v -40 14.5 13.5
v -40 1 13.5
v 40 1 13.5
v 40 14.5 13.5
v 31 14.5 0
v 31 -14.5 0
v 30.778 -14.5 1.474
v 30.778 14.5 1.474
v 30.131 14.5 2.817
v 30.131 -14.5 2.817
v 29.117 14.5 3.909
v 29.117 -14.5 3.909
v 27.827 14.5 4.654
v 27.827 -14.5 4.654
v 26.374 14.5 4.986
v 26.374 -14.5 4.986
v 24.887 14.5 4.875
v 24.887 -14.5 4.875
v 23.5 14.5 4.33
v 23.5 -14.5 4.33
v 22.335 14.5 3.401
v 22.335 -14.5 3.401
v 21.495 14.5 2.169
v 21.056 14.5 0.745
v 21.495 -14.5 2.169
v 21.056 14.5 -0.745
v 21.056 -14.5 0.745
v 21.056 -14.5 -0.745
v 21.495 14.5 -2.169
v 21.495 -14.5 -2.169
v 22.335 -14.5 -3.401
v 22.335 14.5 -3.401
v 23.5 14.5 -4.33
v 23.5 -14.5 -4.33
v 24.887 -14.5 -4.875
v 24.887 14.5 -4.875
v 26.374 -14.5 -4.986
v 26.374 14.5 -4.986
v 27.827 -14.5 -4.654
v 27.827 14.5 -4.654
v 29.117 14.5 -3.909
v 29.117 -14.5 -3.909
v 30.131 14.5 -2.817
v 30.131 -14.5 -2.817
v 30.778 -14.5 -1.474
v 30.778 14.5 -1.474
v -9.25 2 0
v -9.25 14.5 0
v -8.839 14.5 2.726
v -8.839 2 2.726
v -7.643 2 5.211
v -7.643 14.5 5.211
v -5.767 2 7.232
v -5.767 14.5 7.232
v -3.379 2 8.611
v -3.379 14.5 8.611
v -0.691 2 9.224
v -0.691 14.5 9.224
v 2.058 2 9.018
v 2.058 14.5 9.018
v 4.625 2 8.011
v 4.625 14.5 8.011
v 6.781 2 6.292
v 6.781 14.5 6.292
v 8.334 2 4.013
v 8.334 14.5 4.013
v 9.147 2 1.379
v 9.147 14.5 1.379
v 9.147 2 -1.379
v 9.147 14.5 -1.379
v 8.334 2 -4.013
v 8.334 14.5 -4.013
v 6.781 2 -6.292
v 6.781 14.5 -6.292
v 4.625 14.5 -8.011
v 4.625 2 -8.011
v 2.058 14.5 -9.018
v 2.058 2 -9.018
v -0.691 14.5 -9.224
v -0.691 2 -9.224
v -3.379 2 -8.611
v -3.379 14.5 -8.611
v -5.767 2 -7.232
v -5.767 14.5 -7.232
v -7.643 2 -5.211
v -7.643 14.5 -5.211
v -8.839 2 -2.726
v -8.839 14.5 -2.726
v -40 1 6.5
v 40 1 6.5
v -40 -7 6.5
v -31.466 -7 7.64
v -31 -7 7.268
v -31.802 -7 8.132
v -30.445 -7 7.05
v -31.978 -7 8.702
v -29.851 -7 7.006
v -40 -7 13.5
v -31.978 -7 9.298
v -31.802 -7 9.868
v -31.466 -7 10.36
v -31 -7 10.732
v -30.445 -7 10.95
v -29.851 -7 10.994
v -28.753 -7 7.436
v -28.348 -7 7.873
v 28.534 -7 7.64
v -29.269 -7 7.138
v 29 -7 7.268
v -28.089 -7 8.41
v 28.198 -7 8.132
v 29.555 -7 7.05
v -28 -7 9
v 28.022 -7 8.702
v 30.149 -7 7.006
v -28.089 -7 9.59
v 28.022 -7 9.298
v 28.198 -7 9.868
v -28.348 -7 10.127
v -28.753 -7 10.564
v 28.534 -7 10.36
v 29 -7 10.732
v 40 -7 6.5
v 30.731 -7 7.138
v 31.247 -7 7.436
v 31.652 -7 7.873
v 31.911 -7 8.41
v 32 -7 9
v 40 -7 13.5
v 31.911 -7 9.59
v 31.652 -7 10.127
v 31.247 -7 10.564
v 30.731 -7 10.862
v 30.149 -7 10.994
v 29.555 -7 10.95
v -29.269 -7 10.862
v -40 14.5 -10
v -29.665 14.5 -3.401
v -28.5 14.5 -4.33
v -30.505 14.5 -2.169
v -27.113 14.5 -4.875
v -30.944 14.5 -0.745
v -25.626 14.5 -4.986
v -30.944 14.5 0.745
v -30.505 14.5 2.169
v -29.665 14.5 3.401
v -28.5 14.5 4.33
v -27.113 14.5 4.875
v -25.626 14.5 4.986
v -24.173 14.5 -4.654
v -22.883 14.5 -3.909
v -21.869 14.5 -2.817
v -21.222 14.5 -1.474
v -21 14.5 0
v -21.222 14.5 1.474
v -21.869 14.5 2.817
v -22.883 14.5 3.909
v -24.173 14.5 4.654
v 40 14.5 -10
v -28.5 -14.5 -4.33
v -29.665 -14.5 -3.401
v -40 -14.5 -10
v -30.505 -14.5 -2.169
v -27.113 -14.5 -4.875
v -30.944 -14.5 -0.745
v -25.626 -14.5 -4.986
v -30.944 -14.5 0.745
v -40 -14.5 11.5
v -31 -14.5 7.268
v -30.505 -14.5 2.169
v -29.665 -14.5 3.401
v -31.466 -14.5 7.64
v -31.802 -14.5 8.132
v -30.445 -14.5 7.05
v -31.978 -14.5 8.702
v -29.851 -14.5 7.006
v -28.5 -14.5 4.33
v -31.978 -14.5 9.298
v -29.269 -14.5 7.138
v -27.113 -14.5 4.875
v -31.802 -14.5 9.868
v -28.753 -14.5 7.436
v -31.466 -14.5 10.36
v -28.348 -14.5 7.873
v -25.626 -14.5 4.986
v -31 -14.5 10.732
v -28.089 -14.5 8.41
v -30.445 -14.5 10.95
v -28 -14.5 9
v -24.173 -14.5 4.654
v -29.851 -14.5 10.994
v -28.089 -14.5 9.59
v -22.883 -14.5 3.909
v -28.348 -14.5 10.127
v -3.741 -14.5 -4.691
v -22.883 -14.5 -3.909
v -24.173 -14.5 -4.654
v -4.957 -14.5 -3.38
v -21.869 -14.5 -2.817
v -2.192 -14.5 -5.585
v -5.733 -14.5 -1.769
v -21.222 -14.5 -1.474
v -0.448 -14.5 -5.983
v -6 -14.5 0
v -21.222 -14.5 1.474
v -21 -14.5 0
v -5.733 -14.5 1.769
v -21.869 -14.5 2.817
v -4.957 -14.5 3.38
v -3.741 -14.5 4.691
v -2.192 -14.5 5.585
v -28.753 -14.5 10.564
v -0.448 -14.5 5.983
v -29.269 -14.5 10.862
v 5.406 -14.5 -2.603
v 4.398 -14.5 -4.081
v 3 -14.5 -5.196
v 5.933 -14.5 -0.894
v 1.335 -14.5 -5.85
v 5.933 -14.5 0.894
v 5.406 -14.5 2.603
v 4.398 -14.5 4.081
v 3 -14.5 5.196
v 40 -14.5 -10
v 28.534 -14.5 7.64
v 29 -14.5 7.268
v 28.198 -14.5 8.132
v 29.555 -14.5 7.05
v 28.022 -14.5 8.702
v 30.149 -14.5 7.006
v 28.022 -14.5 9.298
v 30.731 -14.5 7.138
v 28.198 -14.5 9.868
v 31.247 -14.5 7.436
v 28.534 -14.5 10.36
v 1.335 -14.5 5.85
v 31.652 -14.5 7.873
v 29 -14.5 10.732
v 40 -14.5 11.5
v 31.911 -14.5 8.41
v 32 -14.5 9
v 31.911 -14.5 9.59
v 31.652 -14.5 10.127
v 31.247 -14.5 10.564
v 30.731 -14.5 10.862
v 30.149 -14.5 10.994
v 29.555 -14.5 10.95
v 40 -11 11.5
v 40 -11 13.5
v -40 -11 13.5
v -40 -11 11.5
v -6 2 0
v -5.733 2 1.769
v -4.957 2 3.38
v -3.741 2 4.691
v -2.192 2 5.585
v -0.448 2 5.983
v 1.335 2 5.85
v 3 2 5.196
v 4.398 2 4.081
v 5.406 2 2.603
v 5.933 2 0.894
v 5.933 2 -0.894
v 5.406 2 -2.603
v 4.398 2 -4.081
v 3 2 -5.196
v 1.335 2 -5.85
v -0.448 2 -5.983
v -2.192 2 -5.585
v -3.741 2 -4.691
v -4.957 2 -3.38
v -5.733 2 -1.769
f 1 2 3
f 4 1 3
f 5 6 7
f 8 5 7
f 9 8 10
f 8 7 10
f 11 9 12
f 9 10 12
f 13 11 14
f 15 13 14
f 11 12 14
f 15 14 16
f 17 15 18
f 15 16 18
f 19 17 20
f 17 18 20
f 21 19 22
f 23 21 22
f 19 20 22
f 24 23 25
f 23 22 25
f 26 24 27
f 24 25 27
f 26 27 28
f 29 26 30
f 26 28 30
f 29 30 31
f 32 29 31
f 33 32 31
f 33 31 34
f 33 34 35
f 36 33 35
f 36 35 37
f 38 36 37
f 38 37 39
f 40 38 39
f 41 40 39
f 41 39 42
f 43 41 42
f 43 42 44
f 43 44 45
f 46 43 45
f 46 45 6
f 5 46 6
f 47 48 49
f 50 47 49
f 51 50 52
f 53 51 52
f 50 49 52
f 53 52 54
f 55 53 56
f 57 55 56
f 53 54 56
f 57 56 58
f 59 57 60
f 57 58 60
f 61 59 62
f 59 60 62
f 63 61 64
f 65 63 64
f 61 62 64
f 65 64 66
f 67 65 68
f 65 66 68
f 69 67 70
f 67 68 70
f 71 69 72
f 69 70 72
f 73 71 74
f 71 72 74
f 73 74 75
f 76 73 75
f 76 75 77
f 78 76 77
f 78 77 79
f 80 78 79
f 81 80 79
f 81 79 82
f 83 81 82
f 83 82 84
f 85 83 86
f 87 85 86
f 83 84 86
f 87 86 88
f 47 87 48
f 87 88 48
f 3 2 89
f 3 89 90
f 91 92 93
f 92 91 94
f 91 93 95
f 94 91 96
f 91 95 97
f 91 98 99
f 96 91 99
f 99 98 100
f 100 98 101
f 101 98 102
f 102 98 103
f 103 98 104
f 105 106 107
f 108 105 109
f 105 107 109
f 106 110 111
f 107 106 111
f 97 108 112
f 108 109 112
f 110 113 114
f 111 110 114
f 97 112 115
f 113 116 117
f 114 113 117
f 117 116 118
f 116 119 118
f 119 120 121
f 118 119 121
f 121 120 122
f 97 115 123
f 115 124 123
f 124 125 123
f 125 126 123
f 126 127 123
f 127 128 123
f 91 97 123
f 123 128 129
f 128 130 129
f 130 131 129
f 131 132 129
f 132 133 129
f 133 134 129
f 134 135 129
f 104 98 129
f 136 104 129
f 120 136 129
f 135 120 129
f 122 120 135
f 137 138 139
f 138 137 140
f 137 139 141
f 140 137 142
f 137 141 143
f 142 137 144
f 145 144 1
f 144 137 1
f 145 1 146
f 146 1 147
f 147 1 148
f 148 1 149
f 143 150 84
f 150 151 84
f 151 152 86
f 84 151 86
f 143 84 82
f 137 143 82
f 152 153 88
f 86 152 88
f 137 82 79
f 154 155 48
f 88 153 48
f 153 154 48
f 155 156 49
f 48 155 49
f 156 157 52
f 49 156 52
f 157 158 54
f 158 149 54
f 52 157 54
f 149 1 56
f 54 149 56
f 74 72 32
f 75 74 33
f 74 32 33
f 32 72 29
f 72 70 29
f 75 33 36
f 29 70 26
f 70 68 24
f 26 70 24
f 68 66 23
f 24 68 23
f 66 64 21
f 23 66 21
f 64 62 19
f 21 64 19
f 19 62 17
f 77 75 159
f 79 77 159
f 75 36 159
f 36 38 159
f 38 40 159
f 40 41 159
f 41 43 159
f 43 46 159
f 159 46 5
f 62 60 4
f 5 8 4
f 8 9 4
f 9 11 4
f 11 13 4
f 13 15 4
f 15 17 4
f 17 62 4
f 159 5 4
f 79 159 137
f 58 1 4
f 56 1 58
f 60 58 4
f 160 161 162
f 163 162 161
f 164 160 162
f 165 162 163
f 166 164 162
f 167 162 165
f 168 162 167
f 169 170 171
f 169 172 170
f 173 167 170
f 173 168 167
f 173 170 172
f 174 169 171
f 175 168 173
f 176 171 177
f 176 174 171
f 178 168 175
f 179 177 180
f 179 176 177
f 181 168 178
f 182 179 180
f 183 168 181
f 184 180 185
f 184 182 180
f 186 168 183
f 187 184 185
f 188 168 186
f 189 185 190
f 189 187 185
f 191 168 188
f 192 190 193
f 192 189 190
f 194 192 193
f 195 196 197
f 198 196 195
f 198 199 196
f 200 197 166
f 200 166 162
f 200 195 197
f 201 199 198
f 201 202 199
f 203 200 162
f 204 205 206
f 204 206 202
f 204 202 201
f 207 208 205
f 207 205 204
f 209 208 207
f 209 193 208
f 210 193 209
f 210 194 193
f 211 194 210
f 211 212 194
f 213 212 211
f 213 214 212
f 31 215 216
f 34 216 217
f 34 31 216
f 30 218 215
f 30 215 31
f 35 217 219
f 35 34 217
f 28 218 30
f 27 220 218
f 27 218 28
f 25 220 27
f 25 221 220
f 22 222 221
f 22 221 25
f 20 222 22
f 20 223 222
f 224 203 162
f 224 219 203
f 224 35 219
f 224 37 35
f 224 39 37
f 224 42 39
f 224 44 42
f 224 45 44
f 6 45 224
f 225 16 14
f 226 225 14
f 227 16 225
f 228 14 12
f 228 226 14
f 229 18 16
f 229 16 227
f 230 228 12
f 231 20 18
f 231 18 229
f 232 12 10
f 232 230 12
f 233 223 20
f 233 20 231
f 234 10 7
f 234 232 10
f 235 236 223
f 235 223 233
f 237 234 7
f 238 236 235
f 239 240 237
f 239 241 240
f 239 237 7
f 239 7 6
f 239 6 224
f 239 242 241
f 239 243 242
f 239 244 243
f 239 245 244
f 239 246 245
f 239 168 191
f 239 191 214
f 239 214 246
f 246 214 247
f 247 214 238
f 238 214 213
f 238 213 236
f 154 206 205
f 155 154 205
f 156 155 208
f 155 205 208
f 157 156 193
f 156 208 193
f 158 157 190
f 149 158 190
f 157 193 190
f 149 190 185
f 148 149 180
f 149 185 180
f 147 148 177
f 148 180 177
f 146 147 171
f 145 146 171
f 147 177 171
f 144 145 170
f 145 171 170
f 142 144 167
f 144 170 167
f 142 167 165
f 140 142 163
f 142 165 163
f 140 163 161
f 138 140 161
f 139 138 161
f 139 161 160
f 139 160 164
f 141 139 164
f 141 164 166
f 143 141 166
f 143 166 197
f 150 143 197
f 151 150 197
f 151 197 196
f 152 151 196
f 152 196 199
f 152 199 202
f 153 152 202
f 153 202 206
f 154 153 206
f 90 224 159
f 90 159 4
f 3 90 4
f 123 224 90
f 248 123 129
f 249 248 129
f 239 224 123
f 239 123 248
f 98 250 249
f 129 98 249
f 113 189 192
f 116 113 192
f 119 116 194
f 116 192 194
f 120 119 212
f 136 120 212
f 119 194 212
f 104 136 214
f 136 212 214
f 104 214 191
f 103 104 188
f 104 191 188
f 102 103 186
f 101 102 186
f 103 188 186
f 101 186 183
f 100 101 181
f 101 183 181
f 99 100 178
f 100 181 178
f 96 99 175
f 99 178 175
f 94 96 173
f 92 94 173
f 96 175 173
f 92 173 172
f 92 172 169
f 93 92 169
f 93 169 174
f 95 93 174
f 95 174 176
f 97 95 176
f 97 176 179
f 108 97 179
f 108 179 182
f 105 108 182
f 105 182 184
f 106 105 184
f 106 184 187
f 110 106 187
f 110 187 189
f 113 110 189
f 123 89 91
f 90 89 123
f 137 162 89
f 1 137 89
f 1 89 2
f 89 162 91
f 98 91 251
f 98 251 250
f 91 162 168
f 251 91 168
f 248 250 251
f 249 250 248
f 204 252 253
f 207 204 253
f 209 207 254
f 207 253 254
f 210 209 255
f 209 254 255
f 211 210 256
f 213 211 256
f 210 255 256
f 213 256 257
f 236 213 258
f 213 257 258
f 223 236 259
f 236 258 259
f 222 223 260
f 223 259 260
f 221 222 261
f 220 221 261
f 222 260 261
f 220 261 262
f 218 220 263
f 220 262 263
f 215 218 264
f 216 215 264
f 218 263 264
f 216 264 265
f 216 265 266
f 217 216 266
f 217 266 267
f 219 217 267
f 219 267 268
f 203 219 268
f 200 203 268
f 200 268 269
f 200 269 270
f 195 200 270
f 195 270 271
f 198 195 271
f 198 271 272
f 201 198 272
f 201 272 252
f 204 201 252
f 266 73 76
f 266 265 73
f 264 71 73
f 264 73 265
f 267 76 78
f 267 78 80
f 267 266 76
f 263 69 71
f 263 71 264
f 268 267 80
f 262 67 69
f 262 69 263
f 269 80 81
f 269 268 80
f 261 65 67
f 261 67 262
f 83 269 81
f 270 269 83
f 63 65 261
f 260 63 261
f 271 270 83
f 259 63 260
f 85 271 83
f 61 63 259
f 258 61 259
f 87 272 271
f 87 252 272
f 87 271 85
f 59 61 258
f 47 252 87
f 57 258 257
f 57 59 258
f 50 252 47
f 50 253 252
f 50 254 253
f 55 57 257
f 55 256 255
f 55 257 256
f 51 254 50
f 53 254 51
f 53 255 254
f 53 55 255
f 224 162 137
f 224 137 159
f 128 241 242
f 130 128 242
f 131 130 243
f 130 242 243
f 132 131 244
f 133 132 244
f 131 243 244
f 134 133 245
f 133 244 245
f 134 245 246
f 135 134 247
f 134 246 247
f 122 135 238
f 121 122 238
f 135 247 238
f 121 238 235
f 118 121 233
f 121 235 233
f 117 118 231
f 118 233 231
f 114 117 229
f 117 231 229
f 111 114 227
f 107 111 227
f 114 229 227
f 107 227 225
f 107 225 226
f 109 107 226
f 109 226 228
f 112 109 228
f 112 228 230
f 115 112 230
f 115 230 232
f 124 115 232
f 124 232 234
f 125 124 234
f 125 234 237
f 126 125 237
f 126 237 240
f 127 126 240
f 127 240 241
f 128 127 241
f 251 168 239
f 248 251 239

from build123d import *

# Parameters (mm, degrees)
F0_W      = 80
F0_H      = 23.5
F1_DEPTH  = 14.5
F2_W      = 80
F2_H      = 2
F3_DEPTH  = 3.5
F4_R      = 6
F5_DEPTH  = 29.001
F6_R      = 9.25
F7_DEPTH  = 12.5
F8_R      = 5
F9_DEPTH  = 29.001
F10_W     = 80
F10_H     = 8
F11_DEPTH = 7
F12_R     = 2
F13_DEPTH = 8


with BuildPart() as f1:
    # F0 (on Front) → F1 (new body, symmetric)
    with BuildSketch(Plane.XZ):
        with Locations((0, 1.75)):
            Rectangle(F0_W, F0_H)
    extrude(amount=F1_DEPTH, both=True)

    # F2 (on face) → F3 (cut)
    with BuildSketch(Plane.XZ.offset(14.5)):
        with Locations((0, 12.5)):
            Rectangle(F2_W, F2_H)
    extrude(amount=-F3_DEPTH, mode=Mode.SUBTRACT)

    # F4 (on face) → F5 (cut, through all)
    with BuildSketch(Plane(origin=(0, 14.5, 0), x_dir=(-1, 0, 0), z_dir=(0, 1, 0))):
        Circle(F4_R)
    extrude(amount=-F5_DEPTH, mode=Mode.SUBTRACT)

    # F6 (on face) → F7 (cut)
    with BuildSketch(Plane(origin=(0, 14.5, 0), x_dir=(-1, 0, 0), z_dir=(0, 1, 0))):
        Circle(F6_R)
    extrude(amount=-F7_DEPTH, mode=Mode.SUBTRACT)

    # F8 (on face) → F9 (cut, through all)
    with BuildSketch(Plane.XZ.offset(14.5)):
        with Locations((-26, 0)):
            Circle(F8_R)
        with Locations((26, 0)):
            Circle(F8_R)
    extrude(amount=-F9_DEPTH, mode=Mode.SUBTRACT)

    # F10 (on face) → F11 (cut)
    with BuildSketch(Plane.XY.offset(13.5)):
        with Locations((0, -3)):
            Rectangle(F10_W, F10_H)
    extrude(amount=-F11_DEPTH, mode=Mode.SUBTRACT)

    # F12 (on face) → F13 (cut)
    with BuildSketch(Plane.XZ.offset(14.5)):
        with Locations((-30, 9)):
            Circle(F12_R)
        with Locations((30, 9)):
            Circle(F12_R)
    extrude(amount=-F13_DEPTH, mode=Mode.SUBTRACT)


solid = f1.part
